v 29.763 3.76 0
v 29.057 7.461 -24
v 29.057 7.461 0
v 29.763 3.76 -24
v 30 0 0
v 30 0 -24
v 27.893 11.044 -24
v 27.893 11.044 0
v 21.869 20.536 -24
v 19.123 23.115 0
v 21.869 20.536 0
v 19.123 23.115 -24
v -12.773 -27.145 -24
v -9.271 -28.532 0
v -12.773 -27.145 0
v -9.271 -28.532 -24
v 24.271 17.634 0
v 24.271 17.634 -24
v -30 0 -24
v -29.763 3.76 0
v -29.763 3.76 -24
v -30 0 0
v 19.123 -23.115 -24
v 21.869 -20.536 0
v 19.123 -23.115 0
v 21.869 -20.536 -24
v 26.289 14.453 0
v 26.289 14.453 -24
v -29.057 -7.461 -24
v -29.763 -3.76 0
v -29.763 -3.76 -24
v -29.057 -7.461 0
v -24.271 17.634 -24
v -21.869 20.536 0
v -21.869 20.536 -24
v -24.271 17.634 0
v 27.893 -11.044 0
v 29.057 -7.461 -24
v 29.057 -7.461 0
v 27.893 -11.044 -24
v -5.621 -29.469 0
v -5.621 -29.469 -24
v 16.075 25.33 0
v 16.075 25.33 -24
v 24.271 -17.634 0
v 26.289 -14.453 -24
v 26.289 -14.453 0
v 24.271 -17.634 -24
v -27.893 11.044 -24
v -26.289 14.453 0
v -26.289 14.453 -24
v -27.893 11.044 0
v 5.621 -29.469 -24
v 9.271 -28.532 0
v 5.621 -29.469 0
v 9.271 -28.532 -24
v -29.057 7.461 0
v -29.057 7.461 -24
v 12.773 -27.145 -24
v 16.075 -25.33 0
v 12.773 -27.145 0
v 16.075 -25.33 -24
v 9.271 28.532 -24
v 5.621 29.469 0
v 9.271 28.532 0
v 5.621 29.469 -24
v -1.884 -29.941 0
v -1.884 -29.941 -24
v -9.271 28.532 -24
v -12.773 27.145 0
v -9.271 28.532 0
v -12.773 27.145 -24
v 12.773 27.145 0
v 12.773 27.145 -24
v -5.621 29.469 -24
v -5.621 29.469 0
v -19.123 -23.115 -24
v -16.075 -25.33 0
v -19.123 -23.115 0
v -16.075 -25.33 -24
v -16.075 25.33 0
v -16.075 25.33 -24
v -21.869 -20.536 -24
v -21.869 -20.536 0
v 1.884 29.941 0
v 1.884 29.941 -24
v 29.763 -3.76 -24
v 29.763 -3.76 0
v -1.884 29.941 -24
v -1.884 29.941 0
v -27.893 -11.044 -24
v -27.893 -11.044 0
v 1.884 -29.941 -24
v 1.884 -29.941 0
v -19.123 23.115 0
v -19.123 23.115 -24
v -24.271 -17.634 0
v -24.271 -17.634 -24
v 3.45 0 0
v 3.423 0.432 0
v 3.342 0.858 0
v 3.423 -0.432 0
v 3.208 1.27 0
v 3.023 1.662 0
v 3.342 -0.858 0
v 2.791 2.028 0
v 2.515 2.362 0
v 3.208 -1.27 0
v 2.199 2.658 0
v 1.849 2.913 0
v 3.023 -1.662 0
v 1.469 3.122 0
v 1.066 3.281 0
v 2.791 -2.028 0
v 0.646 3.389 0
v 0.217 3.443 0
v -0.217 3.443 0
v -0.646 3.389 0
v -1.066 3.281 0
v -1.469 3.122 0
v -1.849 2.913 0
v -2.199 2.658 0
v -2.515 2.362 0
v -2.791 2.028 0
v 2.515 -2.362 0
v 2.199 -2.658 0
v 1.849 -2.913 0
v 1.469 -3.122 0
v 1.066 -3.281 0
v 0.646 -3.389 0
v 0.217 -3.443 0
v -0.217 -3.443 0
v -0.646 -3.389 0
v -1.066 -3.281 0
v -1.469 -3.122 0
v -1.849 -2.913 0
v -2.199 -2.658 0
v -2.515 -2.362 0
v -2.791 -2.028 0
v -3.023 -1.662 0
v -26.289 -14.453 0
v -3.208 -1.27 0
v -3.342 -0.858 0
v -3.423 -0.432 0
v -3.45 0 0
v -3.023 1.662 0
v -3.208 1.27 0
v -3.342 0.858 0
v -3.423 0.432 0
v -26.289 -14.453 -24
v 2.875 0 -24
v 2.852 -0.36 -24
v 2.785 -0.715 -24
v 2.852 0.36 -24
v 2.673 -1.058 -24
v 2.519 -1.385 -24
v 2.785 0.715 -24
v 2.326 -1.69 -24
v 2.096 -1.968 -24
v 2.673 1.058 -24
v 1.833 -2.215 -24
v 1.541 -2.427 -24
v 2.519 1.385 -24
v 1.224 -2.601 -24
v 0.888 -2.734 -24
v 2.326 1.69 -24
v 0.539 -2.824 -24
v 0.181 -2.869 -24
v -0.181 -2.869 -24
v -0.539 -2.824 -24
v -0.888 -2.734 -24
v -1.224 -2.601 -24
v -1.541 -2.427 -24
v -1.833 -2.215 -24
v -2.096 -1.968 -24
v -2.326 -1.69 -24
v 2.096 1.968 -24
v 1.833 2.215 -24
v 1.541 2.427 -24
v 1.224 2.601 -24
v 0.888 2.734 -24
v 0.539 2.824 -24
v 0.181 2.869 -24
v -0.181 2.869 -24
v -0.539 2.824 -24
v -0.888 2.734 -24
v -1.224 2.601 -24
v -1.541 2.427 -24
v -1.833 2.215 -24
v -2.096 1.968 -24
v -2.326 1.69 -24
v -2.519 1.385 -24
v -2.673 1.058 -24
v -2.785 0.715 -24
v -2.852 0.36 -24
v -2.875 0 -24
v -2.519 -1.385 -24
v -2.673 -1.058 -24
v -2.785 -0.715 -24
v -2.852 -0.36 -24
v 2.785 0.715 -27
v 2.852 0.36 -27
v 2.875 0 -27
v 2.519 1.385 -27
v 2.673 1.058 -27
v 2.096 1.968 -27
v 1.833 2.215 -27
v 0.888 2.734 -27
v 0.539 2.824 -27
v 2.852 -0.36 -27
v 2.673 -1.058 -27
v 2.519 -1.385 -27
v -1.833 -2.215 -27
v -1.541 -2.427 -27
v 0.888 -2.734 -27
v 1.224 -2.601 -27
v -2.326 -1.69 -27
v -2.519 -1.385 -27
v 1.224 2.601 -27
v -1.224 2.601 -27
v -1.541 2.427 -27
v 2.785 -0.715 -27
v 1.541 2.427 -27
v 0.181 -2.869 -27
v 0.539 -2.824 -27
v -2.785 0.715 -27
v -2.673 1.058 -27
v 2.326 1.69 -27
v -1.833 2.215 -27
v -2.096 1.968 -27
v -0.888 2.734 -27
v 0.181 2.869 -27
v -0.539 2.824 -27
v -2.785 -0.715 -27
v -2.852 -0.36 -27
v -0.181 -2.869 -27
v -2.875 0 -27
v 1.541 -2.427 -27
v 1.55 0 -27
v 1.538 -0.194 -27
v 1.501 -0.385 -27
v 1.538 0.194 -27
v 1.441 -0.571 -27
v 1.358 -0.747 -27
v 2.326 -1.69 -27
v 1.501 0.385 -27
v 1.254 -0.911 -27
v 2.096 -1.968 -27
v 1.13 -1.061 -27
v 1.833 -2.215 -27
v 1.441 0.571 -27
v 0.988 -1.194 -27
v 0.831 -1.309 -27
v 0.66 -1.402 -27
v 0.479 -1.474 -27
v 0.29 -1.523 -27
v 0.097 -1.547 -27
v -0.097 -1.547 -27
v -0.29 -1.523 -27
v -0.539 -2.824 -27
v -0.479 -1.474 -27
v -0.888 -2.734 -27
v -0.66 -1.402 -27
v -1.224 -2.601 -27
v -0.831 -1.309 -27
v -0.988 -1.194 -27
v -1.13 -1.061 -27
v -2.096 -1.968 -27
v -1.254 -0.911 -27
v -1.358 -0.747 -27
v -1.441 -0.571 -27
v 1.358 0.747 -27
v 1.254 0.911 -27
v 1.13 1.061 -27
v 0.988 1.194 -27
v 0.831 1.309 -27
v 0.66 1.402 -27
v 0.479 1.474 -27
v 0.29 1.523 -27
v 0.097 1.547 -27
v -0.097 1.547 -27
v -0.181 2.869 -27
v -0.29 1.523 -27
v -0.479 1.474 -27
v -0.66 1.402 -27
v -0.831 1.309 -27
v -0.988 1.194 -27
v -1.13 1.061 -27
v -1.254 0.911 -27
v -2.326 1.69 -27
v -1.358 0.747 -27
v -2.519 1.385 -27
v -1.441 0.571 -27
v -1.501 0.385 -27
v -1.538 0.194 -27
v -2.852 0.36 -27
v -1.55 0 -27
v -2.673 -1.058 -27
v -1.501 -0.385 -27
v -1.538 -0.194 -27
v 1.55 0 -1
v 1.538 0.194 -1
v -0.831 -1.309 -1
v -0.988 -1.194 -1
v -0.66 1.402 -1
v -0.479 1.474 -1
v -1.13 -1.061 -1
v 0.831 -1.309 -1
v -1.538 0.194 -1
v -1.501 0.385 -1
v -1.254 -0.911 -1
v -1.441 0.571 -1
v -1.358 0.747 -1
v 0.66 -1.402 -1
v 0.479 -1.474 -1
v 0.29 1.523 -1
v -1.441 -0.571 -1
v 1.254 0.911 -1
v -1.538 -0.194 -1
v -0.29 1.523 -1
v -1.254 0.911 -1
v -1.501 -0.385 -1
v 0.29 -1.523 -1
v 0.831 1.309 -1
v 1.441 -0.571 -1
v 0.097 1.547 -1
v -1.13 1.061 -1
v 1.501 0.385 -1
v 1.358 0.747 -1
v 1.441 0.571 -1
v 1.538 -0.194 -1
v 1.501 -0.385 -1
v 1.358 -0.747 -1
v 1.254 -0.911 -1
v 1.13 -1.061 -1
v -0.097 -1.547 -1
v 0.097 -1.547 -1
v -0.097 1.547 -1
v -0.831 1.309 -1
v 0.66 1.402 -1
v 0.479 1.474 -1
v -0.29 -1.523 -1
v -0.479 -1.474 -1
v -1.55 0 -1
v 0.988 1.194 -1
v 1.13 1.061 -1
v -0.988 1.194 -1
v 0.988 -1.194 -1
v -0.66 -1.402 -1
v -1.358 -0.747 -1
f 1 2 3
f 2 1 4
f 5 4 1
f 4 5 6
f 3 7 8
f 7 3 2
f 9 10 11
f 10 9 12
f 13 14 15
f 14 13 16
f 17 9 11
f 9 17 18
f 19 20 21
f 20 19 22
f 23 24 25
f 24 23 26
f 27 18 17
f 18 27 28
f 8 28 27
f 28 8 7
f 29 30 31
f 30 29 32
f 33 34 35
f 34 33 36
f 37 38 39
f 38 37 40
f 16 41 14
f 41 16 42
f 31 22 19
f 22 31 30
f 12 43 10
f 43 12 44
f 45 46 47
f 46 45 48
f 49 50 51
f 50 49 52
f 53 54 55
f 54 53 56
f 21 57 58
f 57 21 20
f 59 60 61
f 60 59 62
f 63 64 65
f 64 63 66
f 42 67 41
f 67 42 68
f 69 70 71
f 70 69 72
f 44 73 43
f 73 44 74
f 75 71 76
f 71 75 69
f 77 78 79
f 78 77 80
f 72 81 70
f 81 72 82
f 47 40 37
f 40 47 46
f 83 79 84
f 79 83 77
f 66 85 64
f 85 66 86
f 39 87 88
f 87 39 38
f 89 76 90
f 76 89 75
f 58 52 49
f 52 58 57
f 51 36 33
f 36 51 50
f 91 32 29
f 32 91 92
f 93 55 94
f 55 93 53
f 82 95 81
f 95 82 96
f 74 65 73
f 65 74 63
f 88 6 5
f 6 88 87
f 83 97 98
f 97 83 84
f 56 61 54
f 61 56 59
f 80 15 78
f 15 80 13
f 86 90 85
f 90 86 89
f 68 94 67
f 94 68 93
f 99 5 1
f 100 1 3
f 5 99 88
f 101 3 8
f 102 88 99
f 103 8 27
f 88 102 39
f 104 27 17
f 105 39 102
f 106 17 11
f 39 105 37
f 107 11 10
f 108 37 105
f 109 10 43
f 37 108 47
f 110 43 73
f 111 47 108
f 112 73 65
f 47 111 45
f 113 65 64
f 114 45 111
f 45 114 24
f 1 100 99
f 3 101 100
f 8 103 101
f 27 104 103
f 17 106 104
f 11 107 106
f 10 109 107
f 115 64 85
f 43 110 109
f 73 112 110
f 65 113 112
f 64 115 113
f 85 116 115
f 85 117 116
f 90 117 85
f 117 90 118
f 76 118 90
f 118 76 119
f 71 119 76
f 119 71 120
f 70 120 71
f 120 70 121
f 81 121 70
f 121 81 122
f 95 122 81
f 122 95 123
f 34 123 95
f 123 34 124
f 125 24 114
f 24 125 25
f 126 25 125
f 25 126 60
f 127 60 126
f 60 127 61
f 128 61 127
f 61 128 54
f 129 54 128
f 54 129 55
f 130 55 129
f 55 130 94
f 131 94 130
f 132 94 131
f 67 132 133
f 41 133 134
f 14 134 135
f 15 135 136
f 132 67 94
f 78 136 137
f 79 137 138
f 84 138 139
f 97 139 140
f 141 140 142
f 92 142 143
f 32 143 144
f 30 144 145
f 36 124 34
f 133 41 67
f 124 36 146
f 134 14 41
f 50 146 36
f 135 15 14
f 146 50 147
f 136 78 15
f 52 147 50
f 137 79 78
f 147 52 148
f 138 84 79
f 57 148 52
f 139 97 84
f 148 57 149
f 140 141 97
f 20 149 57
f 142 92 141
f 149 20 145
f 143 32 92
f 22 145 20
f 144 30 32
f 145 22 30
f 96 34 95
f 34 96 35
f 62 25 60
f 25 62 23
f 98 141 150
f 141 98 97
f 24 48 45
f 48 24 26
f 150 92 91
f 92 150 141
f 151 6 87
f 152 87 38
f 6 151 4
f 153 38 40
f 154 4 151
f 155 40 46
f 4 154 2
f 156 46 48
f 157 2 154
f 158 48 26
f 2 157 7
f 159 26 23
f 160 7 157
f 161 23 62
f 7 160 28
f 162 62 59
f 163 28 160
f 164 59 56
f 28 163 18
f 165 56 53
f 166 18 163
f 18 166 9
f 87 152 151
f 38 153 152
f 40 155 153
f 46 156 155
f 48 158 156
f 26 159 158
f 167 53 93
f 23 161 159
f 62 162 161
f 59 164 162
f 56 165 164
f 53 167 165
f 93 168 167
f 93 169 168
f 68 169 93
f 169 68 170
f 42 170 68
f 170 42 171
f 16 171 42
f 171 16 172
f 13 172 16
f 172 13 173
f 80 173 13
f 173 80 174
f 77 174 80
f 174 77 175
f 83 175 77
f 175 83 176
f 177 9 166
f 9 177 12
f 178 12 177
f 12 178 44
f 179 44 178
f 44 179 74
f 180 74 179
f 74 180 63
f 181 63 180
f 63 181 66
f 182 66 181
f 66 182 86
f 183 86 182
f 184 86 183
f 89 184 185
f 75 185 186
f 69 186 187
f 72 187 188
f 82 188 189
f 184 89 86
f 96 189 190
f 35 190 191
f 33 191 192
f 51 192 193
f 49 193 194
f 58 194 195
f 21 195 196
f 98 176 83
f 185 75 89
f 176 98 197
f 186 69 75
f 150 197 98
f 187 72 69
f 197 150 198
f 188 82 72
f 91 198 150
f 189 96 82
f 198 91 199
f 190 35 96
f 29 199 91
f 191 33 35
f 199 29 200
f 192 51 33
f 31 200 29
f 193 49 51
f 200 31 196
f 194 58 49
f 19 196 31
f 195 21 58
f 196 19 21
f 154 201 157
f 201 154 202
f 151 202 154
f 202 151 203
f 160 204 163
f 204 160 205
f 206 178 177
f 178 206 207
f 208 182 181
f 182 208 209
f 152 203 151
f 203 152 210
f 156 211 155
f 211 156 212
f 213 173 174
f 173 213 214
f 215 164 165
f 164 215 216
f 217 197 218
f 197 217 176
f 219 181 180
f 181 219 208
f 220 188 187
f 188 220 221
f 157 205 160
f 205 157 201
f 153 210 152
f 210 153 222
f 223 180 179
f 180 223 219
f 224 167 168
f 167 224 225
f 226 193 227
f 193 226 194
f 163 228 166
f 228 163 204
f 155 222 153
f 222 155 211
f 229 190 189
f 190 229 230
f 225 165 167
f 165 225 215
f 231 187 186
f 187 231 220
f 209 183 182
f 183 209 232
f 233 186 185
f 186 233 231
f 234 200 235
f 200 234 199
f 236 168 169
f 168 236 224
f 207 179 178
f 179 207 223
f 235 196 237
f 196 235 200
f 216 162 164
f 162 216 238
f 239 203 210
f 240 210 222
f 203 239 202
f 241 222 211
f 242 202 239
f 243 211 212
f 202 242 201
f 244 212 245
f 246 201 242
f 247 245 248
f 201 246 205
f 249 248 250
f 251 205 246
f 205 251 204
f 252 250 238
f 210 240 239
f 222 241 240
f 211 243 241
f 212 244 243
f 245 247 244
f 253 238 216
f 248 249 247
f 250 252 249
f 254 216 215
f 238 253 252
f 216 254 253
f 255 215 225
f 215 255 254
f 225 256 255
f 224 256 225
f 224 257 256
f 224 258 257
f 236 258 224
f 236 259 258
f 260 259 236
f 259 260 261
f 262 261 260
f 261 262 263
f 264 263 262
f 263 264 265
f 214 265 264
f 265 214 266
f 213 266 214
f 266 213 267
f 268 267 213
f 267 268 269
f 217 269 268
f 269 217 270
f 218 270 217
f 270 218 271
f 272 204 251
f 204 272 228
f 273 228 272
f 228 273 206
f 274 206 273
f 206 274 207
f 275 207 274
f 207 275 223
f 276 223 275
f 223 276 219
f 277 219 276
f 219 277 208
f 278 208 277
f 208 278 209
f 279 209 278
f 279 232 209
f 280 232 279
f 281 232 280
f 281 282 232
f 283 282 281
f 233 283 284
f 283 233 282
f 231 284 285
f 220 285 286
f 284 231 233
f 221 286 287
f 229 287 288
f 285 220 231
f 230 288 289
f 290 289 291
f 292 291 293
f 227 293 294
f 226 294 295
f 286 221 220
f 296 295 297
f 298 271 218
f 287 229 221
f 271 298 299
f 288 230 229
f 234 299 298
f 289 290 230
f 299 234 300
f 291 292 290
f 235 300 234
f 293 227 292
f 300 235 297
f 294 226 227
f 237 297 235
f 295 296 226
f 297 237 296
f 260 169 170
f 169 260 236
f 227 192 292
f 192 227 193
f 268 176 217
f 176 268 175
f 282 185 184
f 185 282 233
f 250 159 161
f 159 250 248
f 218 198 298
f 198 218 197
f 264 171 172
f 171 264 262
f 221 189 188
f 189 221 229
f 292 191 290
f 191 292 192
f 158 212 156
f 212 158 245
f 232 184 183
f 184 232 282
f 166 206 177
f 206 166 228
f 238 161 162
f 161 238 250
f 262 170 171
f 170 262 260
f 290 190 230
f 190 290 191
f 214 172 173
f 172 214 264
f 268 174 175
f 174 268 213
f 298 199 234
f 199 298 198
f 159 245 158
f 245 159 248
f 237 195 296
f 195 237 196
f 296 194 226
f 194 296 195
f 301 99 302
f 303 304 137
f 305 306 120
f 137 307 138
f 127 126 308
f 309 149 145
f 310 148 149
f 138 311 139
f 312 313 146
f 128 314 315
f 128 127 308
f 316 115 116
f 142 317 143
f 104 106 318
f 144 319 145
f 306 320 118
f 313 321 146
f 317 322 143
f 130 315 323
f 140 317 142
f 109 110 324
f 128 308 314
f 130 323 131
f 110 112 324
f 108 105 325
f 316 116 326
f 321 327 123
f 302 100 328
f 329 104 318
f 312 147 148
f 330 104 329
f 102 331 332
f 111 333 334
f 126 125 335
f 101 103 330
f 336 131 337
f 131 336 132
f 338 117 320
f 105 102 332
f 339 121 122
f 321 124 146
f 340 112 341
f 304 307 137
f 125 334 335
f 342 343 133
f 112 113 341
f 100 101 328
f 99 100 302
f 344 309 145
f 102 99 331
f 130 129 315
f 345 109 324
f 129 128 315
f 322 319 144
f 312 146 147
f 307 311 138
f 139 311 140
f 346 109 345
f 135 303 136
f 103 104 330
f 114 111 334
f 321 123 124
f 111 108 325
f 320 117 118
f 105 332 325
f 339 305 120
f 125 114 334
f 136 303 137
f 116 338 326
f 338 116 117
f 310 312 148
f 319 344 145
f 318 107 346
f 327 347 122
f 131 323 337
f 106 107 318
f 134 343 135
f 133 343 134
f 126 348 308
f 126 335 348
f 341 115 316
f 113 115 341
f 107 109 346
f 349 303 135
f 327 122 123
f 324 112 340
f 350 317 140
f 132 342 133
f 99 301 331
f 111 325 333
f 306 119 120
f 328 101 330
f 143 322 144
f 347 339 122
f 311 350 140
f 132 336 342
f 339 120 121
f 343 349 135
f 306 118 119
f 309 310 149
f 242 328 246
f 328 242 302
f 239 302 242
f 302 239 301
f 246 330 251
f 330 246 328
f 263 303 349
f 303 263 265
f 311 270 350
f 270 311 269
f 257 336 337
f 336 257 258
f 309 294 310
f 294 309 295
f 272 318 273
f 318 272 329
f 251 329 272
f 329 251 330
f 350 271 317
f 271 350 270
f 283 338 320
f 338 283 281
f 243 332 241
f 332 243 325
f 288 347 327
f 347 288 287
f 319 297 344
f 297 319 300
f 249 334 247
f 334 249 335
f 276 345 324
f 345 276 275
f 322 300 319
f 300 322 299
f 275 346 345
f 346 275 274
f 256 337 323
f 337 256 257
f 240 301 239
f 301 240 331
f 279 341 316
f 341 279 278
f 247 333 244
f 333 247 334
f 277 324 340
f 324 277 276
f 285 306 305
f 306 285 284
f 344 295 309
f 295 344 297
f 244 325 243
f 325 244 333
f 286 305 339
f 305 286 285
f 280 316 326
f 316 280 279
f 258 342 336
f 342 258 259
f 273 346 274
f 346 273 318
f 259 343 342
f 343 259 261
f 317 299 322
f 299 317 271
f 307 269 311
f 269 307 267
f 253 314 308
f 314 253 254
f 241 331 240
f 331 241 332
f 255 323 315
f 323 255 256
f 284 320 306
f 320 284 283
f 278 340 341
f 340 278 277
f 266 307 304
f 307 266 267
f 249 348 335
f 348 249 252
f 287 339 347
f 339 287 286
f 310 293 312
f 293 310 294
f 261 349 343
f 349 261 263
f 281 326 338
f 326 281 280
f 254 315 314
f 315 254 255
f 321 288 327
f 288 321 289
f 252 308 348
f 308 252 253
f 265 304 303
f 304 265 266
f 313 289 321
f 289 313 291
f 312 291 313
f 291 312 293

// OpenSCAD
$fn = 50;

difference() {
	union() {
		translate(v = [0, 0, -24.0]) {
			cylinder(h = 24, r = 30.0);
		}
		#translate(v = [0, 0, -27.0]) {
			cylinder(h = 27, r = 2.875);
		}
	}
	union() {
		translate(v = [0, 0, 0]) {
			rotate(a = [0, 0, 0]) {
				difference() {
					union() {
						translate(v = [0, 0, -27.0]) {
							cylinder(h = 27, r = 1.25);
						}
						translate(v = [0, 0, -1.0]) {
							cylinder(h = 1.0, r1 = 1.55, r2 = 3.45);
						}
						translate(v = [0, 0, -27.0]) {
							cylinder(h = 27, r = 1.55);
						}
						translate(v = [0, 0, -27.0]) {
							cylinder(h = 27, r = 1.25);
						}
					}
					union();
				}
			}
		}
	}
}
